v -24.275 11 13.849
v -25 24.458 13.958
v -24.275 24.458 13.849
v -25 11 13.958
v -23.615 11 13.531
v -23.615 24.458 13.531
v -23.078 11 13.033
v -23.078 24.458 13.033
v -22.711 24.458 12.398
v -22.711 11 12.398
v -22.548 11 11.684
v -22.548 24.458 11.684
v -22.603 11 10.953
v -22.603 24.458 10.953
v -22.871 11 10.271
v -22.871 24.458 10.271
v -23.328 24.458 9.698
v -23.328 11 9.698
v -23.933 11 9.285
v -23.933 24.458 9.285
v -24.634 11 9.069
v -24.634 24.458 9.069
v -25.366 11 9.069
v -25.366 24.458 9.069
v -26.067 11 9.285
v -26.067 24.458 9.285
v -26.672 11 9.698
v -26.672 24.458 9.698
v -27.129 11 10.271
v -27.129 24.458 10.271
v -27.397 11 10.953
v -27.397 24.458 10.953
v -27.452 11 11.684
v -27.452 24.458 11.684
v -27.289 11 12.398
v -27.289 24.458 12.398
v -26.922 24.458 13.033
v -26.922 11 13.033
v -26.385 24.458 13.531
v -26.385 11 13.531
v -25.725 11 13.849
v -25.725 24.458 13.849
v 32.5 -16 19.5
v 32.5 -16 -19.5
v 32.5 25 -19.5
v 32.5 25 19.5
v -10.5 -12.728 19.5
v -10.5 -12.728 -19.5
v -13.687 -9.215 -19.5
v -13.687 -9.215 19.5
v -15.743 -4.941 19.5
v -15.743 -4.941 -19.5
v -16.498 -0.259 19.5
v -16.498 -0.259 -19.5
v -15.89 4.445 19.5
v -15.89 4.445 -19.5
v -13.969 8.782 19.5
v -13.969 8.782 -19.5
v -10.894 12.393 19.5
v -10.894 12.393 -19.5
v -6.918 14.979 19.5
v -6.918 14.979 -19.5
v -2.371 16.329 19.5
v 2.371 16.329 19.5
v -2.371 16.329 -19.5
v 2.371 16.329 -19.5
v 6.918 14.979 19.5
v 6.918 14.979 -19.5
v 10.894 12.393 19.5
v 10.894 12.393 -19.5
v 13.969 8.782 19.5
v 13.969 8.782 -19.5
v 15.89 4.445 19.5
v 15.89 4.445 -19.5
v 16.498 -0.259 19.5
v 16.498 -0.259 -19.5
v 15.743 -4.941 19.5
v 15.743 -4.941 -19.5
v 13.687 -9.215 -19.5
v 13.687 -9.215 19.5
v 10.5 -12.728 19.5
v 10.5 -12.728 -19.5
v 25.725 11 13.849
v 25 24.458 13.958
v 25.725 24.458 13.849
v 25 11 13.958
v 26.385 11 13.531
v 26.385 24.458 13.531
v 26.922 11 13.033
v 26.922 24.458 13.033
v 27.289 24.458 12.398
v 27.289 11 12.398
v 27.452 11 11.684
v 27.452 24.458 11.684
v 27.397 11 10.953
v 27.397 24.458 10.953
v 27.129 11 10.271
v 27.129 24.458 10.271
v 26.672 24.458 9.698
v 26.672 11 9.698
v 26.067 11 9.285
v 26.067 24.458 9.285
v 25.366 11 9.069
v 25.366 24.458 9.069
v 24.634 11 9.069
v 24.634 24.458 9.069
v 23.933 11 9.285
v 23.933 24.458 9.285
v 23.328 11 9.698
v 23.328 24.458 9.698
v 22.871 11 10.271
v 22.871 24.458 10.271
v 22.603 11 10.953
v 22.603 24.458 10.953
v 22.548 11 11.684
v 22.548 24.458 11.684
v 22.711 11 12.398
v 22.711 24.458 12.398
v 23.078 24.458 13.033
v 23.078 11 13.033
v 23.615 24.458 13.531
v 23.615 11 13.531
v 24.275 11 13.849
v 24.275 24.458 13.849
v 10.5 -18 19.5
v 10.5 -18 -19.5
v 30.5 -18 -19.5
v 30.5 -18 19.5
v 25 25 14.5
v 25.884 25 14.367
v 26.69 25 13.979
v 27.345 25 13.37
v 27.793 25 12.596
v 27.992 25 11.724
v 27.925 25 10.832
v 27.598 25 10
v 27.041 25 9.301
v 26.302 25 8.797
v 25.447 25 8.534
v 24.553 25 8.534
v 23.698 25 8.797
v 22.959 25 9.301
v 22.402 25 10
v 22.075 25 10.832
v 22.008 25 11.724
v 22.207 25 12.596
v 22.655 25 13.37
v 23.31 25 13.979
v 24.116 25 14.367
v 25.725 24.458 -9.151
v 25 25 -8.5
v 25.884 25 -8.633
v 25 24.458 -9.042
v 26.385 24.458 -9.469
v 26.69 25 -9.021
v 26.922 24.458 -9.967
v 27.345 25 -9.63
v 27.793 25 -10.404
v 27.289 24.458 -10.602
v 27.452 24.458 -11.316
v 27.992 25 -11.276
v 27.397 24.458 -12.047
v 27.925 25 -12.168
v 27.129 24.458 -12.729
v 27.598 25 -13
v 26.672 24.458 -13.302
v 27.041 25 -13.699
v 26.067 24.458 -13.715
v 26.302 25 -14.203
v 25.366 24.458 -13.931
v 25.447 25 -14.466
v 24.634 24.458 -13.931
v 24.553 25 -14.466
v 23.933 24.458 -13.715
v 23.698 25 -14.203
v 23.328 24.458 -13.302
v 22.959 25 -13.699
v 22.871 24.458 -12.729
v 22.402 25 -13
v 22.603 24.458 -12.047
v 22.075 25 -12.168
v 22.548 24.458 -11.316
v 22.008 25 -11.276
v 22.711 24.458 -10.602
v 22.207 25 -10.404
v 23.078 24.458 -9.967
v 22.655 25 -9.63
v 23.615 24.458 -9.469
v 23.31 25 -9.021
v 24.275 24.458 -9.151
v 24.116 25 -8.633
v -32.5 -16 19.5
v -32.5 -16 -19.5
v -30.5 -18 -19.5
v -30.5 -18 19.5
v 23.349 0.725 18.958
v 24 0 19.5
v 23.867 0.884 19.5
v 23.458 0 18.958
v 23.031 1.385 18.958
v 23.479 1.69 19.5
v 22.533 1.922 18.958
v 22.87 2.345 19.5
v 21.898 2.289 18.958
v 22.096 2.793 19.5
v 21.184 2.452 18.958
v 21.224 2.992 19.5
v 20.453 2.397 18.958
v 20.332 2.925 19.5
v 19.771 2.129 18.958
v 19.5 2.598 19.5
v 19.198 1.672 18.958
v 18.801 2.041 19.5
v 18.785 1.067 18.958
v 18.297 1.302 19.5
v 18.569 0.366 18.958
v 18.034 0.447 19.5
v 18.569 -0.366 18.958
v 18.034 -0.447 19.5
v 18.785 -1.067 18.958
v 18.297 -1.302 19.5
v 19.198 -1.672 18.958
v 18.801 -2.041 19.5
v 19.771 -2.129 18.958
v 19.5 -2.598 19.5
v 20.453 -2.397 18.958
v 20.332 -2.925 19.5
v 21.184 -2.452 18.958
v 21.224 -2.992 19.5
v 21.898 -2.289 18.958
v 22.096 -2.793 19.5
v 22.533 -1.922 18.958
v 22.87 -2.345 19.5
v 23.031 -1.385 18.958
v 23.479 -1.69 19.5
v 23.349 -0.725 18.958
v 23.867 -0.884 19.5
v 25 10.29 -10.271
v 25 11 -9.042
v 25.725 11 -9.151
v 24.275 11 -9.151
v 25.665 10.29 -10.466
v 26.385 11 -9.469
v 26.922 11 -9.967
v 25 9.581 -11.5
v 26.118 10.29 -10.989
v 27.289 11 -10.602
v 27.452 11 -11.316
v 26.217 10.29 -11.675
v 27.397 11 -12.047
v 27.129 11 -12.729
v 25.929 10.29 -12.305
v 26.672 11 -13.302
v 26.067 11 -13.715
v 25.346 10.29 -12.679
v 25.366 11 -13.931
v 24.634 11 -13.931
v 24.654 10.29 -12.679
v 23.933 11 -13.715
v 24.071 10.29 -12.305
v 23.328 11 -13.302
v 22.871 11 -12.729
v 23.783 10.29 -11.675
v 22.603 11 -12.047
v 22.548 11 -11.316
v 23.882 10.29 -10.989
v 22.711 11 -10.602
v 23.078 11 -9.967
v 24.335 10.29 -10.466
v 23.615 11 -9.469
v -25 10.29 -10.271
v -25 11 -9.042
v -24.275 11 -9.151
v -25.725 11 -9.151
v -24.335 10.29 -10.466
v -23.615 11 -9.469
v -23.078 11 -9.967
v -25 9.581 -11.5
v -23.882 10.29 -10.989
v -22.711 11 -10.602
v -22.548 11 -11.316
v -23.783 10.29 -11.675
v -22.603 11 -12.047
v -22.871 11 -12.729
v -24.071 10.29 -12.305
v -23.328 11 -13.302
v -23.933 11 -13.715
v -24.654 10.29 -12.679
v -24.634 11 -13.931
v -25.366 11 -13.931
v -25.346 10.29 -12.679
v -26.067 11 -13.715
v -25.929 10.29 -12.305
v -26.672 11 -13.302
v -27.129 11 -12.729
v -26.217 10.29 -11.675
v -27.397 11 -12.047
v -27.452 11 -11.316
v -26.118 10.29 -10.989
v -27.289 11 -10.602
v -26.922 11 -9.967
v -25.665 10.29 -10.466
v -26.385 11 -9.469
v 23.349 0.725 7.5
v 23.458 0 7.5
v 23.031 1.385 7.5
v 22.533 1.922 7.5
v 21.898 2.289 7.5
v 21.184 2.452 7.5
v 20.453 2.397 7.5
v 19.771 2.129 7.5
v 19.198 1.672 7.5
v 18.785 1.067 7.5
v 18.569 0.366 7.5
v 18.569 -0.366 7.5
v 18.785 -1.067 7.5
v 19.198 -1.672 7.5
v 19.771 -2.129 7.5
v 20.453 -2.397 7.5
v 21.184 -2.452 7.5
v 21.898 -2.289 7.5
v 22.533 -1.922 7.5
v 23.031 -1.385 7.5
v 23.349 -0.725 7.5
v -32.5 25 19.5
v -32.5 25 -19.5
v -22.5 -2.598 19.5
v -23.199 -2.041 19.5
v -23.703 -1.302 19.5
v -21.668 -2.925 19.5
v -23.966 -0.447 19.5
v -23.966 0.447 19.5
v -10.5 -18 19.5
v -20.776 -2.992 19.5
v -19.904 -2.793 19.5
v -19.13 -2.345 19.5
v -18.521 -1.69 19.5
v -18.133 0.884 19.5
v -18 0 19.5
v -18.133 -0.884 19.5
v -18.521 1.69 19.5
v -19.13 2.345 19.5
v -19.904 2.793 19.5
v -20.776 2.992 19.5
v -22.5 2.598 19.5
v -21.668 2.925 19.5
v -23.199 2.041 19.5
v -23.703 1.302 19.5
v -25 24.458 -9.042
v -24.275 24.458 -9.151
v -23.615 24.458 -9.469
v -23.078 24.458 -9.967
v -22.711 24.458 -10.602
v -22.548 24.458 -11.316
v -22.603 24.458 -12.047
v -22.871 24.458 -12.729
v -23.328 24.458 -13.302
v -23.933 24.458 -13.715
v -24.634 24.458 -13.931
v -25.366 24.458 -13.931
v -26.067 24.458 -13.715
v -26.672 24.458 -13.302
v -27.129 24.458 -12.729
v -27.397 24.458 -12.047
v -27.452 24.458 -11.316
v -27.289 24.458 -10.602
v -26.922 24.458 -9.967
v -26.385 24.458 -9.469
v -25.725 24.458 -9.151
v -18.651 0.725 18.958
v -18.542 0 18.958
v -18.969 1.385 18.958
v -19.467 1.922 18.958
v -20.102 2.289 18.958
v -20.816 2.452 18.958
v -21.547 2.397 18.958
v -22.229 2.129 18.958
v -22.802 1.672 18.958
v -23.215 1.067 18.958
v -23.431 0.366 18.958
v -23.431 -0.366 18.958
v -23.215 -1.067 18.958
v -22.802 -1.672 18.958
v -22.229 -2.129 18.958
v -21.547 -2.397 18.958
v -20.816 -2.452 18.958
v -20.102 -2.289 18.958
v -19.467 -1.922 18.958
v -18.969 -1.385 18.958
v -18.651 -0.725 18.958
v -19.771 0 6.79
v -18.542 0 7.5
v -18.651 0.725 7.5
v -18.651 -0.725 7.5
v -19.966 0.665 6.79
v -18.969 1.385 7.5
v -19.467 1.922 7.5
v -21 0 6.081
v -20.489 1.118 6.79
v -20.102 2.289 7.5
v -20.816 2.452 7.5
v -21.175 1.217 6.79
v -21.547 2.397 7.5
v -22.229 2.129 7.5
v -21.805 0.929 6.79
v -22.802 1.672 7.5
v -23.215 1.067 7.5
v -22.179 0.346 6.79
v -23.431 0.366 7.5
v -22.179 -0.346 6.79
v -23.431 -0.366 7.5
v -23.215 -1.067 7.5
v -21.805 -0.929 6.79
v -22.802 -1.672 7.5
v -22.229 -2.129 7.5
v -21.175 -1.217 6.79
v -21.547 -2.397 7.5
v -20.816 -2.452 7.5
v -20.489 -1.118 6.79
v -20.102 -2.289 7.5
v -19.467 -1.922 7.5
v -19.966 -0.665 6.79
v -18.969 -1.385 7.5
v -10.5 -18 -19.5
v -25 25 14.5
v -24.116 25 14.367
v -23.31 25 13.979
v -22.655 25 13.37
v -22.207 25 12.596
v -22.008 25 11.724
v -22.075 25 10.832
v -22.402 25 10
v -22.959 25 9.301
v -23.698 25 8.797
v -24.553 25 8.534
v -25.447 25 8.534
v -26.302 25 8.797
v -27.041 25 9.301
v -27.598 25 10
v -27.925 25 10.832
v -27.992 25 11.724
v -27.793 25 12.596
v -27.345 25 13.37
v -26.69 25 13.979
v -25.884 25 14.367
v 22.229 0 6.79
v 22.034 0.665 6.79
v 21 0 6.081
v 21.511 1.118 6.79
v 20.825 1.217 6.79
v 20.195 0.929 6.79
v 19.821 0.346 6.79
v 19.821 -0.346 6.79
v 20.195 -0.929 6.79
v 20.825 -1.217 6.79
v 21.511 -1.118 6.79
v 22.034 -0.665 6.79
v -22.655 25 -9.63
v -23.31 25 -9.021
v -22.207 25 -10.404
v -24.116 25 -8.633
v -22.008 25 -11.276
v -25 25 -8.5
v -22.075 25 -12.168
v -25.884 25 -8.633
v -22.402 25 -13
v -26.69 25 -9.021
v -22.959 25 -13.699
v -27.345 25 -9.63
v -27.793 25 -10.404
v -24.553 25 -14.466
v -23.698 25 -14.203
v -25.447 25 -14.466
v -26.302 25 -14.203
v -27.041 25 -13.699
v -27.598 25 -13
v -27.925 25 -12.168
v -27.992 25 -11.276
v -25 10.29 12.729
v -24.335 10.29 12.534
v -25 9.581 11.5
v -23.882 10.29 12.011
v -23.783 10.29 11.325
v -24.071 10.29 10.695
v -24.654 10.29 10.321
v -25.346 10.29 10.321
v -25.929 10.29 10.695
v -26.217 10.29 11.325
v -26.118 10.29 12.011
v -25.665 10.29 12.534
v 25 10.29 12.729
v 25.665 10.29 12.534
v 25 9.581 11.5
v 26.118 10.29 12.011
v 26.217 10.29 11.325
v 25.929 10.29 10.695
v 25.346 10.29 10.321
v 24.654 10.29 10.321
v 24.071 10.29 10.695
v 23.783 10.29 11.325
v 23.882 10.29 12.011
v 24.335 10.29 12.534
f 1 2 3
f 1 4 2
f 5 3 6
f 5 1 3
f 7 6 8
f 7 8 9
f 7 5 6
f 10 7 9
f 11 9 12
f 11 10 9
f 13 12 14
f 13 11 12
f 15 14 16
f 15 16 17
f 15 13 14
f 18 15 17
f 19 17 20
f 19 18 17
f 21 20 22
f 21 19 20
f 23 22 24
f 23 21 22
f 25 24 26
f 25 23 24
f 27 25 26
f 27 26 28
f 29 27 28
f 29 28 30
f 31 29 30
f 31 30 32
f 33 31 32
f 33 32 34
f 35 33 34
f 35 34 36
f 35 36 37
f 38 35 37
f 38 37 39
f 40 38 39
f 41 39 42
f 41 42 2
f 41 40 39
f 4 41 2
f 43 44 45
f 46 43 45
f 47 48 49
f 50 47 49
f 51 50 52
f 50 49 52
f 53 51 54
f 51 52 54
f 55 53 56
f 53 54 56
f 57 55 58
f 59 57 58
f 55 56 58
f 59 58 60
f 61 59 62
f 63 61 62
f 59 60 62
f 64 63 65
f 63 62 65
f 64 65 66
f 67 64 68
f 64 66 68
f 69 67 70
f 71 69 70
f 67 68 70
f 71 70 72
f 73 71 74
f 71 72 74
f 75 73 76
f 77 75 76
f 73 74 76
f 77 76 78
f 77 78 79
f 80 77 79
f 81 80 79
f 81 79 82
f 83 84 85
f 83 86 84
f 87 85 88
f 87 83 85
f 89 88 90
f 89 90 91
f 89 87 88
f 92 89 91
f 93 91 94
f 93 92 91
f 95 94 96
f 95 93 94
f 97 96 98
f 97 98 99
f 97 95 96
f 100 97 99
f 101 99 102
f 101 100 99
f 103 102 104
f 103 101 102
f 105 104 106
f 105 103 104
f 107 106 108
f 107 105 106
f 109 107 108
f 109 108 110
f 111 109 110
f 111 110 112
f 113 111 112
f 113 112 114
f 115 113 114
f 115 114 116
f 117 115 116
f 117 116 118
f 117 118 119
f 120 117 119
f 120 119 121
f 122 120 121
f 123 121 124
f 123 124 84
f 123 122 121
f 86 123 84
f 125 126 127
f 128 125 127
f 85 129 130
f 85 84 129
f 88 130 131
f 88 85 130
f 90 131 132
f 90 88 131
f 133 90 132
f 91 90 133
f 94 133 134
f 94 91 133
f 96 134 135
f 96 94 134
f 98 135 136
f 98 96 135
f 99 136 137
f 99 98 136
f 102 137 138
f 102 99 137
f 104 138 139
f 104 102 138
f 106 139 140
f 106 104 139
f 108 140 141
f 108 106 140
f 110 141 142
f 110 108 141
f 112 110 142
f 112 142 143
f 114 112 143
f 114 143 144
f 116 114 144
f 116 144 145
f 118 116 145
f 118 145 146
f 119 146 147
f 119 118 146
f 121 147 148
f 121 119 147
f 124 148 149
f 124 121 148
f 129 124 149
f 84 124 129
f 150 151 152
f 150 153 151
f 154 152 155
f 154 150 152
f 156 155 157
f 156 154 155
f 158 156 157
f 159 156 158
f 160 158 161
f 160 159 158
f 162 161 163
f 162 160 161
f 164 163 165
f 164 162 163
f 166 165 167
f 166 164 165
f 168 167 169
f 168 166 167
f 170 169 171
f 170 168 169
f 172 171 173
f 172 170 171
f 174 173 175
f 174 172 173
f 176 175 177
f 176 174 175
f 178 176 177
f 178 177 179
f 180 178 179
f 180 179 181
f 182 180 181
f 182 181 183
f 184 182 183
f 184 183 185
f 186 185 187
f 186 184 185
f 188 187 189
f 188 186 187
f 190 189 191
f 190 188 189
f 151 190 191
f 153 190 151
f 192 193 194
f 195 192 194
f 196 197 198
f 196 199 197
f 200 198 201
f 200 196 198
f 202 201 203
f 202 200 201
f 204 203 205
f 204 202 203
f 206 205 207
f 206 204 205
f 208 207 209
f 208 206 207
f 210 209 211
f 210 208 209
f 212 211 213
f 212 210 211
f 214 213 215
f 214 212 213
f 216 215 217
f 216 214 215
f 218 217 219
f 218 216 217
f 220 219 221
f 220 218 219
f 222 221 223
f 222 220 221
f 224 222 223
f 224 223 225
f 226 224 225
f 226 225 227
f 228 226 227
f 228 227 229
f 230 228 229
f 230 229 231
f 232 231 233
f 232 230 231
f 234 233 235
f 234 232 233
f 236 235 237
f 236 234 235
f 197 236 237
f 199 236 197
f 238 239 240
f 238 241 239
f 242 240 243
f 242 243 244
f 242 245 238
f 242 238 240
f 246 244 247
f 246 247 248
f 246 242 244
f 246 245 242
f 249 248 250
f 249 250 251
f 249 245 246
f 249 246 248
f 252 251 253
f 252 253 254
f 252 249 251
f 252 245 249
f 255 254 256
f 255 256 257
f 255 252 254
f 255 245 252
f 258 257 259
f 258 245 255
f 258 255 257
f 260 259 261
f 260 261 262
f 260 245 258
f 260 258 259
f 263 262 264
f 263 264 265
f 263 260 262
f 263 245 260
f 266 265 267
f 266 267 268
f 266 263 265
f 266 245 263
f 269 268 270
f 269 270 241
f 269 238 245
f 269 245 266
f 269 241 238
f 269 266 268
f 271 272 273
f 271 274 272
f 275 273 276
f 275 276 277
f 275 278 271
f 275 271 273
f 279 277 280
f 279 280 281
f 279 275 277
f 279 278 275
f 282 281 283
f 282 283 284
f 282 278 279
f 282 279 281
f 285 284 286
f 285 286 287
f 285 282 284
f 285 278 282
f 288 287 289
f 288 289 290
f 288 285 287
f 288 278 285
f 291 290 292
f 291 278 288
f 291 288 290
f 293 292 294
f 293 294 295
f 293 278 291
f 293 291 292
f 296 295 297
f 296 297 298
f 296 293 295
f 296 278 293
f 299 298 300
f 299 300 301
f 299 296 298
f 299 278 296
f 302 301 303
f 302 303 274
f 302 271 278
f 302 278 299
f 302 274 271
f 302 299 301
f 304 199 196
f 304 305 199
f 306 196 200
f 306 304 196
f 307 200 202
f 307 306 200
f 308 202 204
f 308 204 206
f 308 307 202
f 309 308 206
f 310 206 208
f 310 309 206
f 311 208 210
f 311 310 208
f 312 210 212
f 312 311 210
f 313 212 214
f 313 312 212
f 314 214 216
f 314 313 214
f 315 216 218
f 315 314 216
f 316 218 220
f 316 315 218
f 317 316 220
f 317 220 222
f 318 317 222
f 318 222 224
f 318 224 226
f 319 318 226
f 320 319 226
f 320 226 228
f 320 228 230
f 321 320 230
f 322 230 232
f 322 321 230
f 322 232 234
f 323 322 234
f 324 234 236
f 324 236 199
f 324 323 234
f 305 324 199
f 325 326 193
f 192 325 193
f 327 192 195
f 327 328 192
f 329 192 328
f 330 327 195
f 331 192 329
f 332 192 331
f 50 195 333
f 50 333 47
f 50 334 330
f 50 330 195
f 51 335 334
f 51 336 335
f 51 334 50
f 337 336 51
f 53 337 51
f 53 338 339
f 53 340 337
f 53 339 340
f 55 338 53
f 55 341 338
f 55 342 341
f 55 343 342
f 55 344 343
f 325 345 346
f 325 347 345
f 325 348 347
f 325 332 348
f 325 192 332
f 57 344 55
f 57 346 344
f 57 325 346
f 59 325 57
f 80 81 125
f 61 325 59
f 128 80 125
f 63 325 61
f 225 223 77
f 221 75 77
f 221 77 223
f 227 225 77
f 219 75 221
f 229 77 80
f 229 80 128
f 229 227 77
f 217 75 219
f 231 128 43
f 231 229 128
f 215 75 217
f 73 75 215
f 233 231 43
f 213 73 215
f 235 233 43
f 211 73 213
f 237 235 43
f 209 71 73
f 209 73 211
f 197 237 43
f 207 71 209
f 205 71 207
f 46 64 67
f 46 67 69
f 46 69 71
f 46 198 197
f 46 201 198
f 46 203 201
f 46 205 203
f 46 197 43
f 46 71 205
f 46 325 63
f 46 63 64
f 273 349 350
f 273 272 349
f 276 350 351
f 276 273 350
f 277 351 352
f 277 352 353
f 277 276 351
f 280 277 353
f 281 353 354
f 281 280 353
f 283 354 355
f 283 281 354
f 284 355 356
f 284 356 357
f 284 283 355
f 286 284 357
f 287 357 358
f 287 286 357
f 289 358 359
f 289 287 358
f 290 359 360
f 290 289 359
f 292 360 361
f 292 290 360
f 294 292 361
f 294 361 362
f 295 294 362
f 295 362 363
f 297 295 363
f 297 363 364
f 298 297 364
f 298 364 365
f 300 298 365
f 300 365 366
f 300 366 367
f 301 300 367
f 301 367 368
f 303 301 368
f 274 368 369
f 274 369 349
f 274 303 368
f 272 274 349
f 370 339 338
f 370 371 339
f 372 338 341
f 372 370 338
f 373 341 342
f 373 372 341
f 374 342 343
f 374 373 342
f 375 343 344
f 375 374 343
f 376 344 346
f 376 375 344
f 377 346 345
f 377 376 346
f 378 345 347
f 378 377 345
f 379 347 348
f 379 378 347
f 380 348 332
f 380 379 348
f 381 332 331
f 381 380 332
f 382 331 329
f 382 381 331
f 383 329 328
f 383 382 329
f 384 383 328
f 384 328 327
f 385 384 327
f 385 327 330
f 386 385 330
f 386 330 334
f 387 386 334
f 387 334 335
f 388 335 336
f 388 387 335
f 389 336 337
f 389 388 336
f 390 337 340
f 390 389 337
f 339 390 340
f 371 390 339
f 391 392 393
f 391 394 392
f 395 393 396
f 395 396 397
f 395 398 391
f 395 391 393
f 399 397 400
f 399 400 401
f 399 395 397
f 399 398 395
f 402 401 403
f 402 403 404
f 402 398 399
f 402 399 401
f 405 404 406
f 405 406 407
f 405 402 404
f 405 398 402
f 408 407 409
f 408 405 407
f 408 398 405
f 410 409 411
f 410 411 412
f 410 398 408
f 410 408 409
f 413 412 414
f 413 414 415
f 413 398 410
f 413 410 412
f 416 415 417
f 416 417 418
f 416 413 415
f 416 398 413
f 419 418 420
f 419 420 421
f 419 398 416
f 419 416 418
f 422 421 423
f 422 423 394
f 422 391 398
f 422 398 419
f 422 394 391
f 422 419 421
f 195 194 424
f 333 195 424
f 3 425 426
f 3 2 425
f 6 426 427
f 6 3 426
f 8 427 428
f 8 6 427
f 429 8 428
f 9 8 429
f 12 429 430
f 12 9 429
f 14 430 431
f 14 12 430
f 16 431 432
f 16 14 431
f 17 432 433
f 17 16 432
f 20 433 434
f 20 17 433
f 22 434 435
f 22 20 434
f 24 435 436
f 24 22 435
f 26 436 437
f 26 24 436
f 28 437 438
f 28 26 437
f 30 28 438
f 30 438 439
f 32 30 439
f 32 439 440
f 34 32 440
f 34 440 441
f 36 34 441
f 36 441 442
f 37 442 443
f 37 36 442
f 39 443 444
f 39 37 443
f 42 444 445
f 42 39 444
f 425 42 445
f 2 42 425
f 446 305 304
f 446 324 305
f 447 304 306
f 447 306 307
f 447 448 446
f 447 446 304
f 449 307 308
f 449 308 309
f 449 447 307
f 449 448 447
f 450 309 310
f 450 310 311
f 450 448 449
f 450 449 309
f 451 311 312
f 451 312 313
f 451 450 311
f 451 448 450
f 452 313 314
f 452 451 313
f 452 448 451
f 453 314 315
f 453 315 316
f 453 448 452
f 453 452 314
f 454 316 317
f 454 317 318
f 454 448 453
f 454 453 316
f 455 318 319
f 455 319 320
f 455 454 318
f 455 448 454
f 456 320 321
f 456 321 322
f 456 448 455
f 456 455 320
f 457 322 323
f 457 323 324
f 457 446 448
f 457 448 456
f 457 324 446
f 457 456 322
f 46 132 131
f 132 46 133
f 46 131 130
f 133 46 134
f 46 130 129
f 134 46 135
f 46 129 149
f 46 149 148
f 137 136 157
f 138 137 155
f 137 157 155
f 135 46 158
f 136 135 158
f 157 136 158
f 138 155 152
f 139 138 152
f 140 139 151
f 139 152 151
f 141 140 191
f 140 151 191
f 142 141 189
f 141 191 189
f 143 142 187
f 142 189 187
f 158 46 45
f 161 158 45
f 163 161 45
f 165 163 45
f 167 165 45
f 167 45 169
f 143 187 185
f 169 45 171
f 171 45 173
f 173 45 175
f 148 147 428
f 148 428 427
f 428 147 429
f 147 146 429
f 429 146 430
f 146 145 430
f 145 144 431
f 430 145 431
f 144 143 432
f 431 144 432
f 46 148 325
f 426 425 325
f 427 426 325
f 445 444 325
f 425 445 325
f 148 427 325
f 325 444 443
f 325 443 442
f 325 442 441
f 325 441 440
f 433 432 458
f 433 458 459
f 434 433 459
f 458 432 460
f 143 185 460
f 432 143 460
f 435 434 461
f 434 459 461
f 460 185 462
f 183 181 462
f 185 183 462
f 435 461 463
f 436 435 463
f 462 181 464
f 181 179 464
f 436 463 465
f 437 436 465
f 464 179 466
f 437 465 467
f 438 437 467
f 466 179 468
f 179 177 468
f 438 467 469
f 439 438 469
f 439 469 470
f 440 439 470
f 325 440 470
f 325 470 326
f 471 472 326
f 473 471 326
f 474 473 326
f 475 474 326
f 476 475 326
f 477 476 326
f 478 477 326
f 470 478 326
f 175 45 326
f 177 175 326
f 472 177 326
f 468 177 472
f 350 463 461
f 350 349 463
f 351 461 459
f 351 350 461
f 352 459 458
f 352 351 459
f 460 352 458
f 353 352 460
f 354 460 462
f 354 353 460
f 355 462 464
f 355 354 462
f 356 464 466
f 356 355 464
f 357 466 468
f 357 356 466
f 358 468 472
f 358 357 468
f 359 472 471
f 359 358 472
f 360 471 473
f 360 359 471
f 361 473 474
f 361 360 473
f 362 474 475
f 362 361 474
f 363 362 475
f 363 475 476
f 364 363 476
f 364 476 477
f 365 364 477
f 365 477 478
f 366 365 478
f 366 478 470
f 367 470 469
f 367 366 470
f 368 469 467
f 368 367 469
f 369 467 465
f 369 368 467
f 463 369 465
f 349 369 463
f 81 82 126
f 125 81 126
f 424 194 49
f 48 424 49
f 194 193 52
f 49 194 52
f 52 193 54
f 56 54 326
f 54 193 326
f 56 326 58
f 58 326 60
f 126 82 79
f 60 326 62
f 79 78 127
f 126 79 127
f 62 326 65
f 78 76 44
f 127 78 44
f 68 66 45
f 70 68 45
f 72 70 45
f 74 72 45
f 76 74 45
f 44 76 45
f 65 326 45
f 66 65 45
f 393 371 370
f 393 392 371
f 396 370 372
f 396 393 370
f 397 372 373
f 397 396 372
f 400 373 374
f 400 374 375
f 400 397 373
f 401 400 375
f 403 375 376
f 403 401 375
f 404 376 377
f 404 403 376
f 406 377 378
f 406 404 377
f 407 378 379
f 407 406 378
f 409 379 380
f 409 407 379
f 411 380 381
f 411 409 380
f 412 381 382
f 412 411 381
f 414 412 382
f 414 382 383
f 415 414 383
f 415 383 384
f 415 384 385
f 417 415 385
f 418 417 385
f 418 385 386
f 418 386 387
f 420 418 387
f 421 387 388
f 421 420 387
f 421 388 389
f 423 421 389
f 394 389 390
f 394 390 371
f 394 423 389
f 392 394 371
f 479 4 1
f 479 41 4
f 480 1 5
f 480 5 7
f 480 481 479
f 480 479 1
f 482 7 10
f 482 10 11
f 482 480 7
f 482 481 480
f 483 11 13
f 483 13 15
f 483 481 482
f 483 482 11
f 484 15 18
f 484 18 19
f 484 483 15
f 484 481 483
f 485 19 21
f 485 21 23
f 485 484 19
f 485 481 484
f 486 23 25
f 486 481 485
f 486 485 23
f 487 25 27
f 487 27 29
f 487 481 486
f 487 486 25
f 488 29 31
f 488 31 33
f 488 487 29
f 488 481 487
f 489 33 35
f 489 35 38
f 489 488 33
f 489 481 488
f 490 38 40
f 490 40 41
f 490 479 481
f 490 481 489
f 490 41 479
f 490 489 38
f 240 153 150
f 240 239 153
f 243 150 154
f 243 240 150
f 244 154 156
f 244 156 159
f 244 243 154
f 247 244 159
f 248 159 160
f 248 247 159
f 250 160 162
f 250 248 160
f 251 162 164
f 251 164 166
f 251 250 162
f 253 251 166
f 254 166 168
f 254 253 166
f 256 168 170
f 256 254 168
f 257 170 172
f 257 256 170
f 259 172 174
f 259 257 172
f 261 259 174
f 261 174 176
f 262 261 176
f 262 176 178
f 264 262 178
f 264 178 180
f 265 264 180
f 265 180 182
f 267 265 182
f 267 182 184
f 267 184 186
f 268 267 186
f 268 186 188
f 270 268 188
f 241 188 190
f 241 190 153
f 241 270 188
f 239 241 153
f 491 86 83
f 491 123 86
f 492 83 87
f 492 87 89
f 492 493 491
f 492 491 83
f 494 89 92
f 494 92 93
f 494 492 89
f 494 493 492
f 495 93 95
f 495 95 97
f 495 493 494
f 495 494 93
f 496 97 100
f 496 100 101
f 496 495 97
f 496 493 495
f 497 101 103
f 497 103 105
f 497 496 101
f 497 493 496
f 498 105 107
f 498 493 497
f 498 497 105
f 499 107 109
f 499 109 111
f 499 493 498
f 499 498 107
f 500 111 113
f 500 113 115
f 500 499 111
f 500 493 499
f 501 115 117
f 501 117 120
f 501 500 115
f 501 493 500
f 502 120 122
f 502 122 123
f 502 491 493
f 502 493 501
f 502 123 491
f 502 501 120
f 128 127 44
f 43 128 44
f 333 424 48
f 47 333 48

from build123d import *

# Parameters (mm, degrees)
EXTRUDE_1_DEPTH      = 19.5
EXTRUDE_1_DEPTH_BACK = 19.5


with BuildPart() as part:
    # 草图1 → 凸台-拉伸1 (new, two sides: drawn at the far end of the back side and taken through both)
    with BuildSketch(Plane.XY.offset(-EXTRUDE_1_DEPTH_BACK)):
        with BuildLine():
            Line((-32.5, 25), (-32.5, -16))
            Line((-32.5, -16), (-30.5, -18))
            Line((-30.5, -18), (-10.5, -18))
            Line((-10.5, -18), (-10.5, -12.727922061))
            ThreePointArc((-10.5, -12.727922061), (0, 16.5), (10.5, -12.727922061))
            Line((10.5, -12.727922061), (10.5, -18))
            Line((10.5, -18), (30.5, -18))
            Line((30.5, -18), (32.5, -16))
            Line((32.5, -16), (32.5, 25))
            Line((32.5, 25), (-32.5, 25))
        make_face()
    extrude(amount=EXTRUDE_1_DEPTH + EXTRUDE_1_DEPTH_BACK)

    # 草图2 → 切除-旋转1 (revolve, cut)
    with BuildSketch(Plane(origin=(21, 0, 0), x_dir=(0, 0, -1), z_dir=(1, 0, 0))):
        Polygon((-19.5, 0), (-19.5, 3), (-18.9585, 2.4585), (-7.5, 2.4585), (-6.080584363, 0), align=None)
    revolve(axis=Axis((21, 0, 6.080584363), (0, 0, 1)), mode=Mode.SUBTRACT)

    # 草图3 → 切除-旋转2 (revolve, cut)
    with BuildSketch(Plane(origin=(-21, 0, 0), x_dir=(0, 0, -1), z_dir=(1, 0, 0))):
        Polygon((-19.5, 0), (-19.5, 3), (-18.9585, 2.4585), (-7.5, 2.4585), (-6.080584363, 0), align=None)
    revolve(axis=Axis((-21, 0, 6.080584363), (0, 0, 1)), mode=Mode.SUBTRACT)

    # 草图4 → 切除-旋转3 (revolve, cut)
    with BuildSketch(Plane(origin=(25, 0, 0), x_dir=(0, 0, -1), z_dir=(1, 0, 0))):
        Polygon((-11.5, 25), (-8.5, 25), (-9.0415, 24.4585), (-9.0415, 11), (-11.5, 9.580584363), align=None)
    revolve(axis=Axis((25, 9.580584363, 11.5), (0, 1, 0)), mode=Mode.SUBTRACT)

    # 草图5 → 切除-旋转4 (revolve, cut)
    with BuildSketch(Plane(origin=(25, 0, 0), x_dir=(0, 0, -1), z_dir=(1, 0, 0))):
        Polygon((11.5, 25), (14.5, 25), (13.9585, 24.4585), (13.9585, 11), (11.5, 9.580584363), align=None)
    revolve(axis=Axis((25, 9.580584363, -11.5), (0, 1, 0)), mode=Mode.SUBTRACT)

    # 草图6 → 切除-旋转5 (revolve, cut)
    with BuildSketch(Plane(origin=(-25, 0, 0), x_dir=(0, 0, -1), z_dir=(1, 0, 0))):
        Polygon((-11.5, 25), (-8.5, 25), (-9.0415, 24.4585), (-9.0415, 11), (-11.5, 9.580584363), align=None)
    revolve(axis=Axis((-25, 9.580584363, 11.5), (0, 1, 0)), mode=Mode.SUBTRACT)

    # 草图7 → 切除-旋转6 (revolve, cut)
    with BuildSketch(Plane(origin=(-25, 0, 0), x_dir=(0, 0, -1), z_dir=(1, 0, 0))):
        Polygon((11.5, 25), (14.5, 25), (13.9585, 24.4585), (13.9585, 11), (11.5, 9.580584363), align=None)
    revolve(axis=Axis((-25, 9.580584363, -11.5), (0, 1, 0)), mode=Mode.SUBTRACT)


solid = part.part
